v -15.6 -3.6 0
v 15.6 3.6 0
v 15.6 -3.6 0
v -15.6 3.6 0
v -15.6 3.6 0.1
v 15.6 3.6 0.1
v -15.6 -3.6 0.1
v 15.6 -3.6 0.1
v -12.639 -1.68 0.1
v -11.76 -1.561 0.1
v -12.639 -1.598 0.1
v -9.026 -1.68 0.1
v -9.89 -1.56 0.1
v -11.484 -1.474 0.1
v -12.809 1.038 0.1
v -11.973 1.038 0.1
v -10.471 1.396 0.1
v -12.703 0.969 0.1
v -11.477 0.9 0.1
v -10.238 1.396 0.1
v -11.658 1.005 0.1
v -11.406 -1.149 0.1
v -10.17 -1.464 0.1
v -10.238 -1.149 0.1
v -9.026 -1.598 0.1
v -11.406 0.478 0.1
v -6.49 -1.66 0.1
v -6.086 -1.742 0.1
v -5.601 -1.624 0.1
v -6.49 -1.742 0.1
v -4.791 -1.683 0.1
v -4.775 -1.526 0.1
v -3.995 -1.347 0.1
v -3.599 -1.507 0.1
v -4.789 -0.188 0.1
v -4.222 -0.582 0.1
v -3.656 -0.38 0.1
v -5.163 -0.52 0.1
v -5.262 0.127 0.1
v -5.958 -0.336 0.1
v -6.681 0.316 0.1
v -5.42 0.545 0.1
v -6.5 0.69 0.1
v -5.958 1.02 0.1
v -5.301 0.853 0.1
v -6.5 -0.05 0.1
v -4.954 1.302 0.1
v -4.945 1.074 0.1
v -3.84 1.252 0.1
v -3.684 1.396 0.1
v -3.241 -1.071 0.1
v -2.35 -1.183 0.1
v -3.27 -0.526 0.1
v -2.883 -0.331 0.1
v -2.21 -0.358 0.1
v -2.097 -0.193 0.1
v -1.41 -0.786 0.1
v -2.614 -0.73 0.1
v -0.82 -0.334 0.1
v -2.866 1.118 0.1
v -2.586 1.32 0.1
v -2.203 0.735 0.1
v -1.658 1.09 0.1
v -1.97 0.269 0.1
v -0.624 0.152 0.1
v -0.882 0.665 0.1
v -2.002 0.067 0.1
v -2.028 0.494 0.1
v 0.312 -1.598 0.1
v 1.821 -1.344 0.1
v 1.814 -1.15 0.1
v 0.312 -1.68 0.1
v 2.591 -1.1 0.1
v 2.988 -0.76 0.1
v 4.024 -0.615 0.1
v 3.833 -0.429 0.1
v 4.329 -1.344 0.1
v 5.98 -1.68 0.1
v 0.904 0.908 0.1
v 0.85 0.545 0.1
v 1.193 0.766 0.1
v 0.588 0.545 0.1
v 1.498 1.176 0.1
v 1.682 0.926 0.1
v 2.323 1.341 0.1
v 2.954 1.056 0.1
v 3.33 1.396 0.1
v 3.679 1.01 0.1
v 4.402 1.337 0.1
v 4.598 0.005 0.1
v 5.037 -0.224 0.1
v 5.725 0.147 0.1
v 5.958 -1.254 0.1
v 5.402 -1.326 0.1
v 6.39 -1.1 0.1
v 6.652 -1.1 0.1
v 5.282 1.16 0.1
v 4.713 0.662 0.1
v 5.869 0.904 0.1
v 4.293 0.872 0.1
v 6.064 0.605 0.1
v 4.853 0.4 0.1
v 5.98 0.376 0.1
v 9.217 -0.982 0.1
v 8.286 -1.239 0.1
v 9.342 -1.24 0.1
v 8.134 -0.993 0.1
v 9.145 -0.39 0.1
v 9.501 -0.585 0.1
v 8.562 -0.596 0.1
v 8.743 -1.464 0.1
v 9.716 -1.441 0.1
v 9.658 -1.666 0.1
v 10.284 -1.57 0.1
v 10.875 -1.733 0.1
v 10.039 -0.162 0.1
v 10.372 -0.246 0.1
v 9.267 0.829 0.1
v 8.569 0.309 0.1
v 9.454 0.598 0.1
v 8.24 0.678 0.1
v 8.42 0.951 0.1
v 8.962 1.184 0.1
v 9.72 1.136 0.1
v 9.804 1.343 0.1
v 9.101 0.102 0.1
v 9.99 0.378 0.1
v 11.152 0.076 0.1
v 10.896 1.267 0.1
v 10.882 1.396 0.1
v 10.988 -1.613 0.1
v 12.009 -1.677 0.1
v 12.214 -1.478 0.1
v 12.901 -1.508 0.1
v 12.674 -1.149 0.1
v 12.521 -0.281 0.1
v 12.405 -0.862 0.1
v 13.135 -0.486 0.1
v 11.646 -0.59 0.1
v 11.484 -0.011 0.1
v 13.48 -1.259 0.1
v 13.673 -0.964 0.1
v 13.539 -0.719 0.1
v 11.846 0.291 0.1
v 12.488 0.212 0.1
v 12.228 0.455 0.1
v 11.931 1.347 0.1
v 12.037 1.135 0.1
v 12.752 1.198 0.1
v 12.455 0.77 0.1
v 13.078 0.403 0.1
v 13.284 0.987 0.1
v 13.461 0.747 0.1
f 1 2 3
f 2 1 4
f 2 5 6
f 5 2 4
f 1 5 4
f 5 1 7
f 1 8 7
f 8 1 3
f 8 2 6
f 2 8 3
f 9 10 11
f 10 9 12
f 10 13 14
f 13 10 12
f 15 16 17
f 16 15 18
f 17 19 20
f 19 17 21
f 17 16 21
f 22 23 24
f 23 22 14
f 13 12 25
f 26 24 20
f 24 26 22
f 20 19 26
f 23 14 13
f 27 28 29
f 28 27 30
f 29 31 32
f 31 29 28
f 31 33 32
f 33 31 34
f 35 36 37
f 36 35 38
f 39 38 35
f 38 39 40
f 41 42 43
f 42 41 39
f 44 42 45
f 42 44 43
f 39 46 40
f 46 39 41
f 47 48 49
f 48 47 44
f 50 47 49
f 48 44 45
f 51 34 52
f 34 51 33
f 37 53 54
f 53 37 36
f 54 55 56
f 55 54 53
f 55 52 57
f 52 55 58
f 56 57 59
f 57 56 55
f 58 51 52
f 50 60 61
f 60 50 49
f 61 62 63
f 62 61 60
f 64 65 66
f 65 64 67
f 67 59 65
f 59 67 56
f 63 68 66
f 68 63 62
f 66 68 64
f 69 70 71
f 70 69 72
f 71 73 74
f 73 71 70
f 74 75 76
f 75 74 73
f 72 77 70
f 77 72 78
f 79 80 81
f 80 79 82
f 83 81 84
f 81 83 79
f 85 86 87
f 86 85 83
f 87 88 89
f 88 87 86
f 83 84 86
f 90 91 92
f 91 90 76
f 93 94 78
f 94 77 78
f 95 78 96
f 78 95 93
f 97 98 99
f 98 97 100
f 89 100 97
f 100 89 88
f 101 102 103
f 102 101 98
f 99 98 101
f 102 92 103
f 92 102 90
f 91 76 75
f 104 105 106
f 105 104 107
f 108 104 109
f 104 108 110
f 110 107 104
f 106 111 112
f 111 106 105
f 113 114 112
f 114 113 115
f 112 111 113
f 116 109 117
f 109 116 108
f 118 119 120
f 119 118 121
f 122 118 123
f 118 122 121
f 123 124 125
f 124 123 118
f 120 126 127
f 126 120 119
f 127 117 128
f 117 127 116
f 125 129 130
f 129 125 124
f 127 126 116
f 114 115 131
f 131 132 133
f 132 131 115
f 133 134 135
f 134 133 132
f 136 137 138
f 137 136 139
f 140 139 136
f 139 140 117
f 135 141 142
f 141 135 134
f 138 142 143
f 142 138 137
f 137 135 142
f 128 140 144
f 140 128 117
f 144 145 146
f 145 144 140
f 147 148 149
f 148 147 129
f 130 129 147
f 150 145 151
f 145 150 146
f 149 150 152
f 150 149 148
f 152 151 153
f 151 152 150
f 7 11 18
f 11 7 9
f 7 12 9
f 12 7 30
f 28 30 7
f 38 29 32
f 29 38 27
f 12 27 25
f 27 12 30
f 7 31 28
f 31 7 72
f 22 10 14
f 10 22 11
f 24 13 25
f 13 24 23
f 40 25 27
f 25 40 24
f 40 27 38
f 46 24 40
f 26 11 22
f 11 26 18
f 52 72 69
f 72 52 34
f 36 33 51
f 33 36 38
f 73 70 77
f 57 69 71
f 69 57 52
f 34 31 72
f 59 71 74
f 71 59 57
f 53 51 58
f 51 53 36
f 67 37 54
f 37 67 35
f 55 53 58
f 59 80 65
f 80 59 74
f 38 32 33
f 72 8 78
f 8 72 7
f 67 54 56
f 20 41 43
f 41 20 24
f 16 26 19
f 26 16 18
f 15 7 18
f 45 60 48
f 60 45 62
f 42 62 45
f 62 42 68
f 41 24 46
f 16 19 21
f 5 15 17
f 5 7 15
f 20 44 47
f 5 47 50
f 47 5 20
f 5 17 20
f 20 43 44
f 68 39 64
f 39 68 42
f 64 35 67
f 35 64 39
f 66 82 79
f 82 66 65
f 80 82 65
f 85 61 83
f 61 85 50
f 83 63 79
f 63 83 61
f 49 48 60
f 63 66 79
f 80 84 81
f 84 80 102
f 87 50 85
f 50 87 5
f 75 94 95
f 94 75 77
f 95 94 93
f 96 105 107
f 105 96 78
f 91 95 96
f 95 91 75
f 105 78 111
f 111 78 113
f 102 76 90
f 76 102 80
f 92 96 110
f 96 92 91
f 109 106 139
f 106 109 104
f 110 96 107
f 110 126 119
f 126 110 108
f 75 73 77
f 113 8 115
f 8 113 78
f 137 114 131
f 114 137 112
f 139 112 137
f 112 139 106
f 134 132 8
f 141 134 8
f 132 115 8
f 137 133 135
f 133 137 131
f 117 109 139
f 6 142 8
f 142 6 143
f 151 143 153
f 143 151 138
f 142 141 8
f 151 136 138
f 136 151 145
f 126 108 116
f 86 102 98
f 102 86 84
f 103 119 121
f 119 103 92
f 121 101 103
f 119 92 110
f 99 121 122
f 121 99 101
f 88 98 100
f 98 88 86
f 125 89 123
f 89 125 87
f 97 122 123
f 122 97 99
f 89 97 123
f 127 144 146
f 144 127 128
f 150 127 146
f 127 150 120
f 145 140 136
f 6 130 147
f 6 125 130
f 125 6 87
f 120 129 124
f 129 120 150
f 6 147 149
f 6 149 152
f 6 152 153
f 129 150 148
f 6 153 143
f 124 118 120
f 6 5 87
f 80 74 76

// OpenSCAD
// file: ../p/box5-12.scad
use <../lib.scad>
function ldraw_lib__box5_12() = [
// 0 Box with 5 Faces without Any Edges
// 0 Name: box5-12.dat
// 0 Author: Chris Dee [cwdee]
// 0 !LDRAW_ORG Primitive UPDATE 2009-02
// 0 !LICENSE Licensed under CC BY 2.0 and CC BY 4.0 : see CAreadme.txt
// 
// 0 BFC CERTIFY CCW
  [0,"BFC","CERTIFY"],
  [0,"BFC","CCW"],
// 
// 0 !HISTORY 2009-09-03 [PTadmin] Official Update 2009-02
// 
// 
// 4 16 1 1 1 1 1 -1 -1 1 -1 -1 1 1
  [4,16,1,1,1,1,1,-1,-1,1,-1,-1,1,1],
// 4 16 -1 0 1 1 0 1 1 1 1 -1 1 1
  [4,16,-1,0,1,1,0,1,1,1,1,-1,1,1],
// 4 16 -1 0 -1 -1 0 1 -1 1 1 -1 1 -1
  [4,16,-1,0,-1,-1,0,1,-1,1,1,-1,1,-1],
// 4 16 1 0 -1 -1 0 -1 -1 1 -1 1 1 -1
  [4,16,1,0,-1,-1,0,-1,-1,1,-1,1,1,-1],
// 4 16 1 0 1 1 0 -1 1 1 -1 1 1 1
  [4,16,1,0,1,1,0,-1,1,1,-1,1,1,1],
// 0
];
module ldraw_lib__box5_12(step=0, col=false, unit=2/5, alt=false, line=0.2, solid=!$preview)
    makepoly(ldraw_lib__box5_12(), step=step, col=col, unit=unit, alt=alt, line=line, solid=solid);
ldraw_lib__box5_12(line=0.2);
// main file
use <../lib.scad>
use <../p/box5-12.scad>
function ldraw_lib__4188571l() = [
// 0 Sticker  0.9 x  3.9 with Black "1928"
// 0 Name: 4188571l.dat
// 0 Author: Gerald Lasser [GeraldLasser]
// 0 !LDRAW_ORG Part UPDATE 2015-01
// 0 !LICENSE Licensed under CC BY 2.0 and CC BY 4.0 : see CAreadme.txt
// 
// 0 BFC CERTIFY CCW
  [0,"BFC","CERTIFY"],
  [0,"BFC","CCW"],
// 
// 0 !KEYWORDS santa fe, Train
// 
// 0 !HISTORY 2015-10-11 [PTadmin] Official Update 2015-01
// 
// 
// 0 // Original Text Produced by txt2dat, Copyright 2005-2007, 2009 R. Crawford
// 0 // Using font: "Times New Roman" style: "Regular" size: 40pt
// 0 // LDRAW Scaling of Txt2dat output: 1.02 0 0 0 1 0 0 0 0.32
// 
// 1 80 0 -0.25 0 39 0 0 0 0.25 0 0 0 9 box5-12.dat
  [1,80,0,-0.25,0,39,0,0,0,0.25,0,0,0,9, ldraw_lib__box5_12()],
// 
// 4 0 -29.401 -0.25 -3.903 -31.598 -0.25 -3.994 -31.598 -0.25 -4.2 -22.564 -0.25 -4.2
  [4,0,-29.401,-0.25,-3.903,-31.598,-0.25,-3.994,-31.598,-0.25,-4.2,-22.564,-0.25,-4.2],
// 4 0 -24.726 -0.25 -3.9 -28.711 -0.25 -3.686 -29.401 -0.25 -3.903 -22.564 -0.25 -4.2
  [4,0,-24.726,-0.25,-3.9,-28.711,-0.25,-3.686,-29.401,-0.25,-3.903,-22.564,-0.25,-4.2],
// 4 0 -32.023 -0.25 2.596 -31.758 -0.25 2.423 -29.933 -0.25 2.596 -26.178 -0.25 3.49
  [4,0,-32.023,-0.25,2.596,-31.758,-0.25,2.423,-29.933,-0.25,2.596,-26.178,-0.25,3.49],
// 4 0 -26.178 -0.25 3.49 -29.144 -0.25 2.512 -28.693 -0.25 2.251 -25.594 -0.25 3.49
  [4,0,-26.178,-0.25,3.49,-29.144,-0.25,2.512,-28.693,-0.25,2.251,-25.594,-0.25,3.49],
// 3 0 -26.178 -0.25 3.49 -29.933 -0.25 2.596 -29.144 -0.25 2.512
  [3,0,-26.178,-0.25,3.49,-29.933,-0.25,2.596,-29.144,-0.25,2.512],
// 4 0 -28.516 -0.25 -2.872 -28.711 -0.25 -3.686 -25.426 -0.25 -3.661 -25.594 -0.25 -2.872
  [4,0,-28.516,-0.25,-2.872,-28.711,-0.25,-3.686,-25.426,-0.25,-3.661,-25.594,-0.25,-2.872],
// 3 0 -24.726 -0.25 -3.9 -22.564 -0.25 -4.2 -22.564 -0.25 -3.994
  [3,0,-24.726,-0.25,-3.9,-22.564,-0.25,-4.2,-22.564,-0.25,-3.994],
// 4 0 -28.516 -0.25 1.196 -28.516 -0.25 -2.872 -25.594 -0.25 -2.872 -25.594 -0.25 3.49
  [4,0,-28.516,-0.25,1.196,-28.516,-0.25,-2.872,-25.594,-0.25,-2.872,-25.594,-0.25,3.49],
// 3 0 -25.594 -0.25 3.49 -28.693 -0.25 2.251 -28.516 -0.25 1.196
  [3,0,-25.594,-0.25,3.49,-28.693,-0.25,2.251,-28.516,-0.25,1.196],
// 3 0 -25.426 -0.25 -3.661 -28.711 -0.25 -3.686 -24.726 -0.25 -3.9
  [3,0,-25.426,-0.25,-3.661,-28.711,-0.25,-3.686,-24.726,-0.25,-3.9],
// 4 0 -16.224 -0.25 -4.15 -16.224 -0.25 -4.356 -15.214 -0.25 -4.356 -14.002 -0.25 -4.06
  [4,0,-16.224,-0.25,-4.15,-16.224,-0.25,-4.356,-15.214,-0.25,-4.356,-14.002,-0.25,-4.06],
// 4 0 -14.002 -0.25 -4.06 -15.214 -0.25 -4.356 -11.978 -0.25 -4.208 -11.938 -0.25 -3.814
  [4,0,-14.002,-0.25,-4.06,-15.214,-0.25,-4.356,-11.978,-0.25,-4.208,-11.938,-0.25,-3.814],
// 4 0 -8.997 -0.25 -3.767 -9.988 -0.25 -3.367 -11.938 -0.25 -3.814 -11.978 -0.25 -4.208
  [4,0,-8.997,-0.25,-3.767,-9.988,-0.25,-3.367,-11.938,-0.25,-3.814,-11.978,-0.25,-4.208],
// 4 0 -10.556 -0.25 -1.455 -9.139 -0.25 -0.949 -11.973 -0.25 -0.471 -12.907 -0.25 -1.301
  [4,0,-10.556,-0.25,-1.455,-9.139,-0.25,-0.949,-11.973,-0.25,-0.471,-12.907,-0.25,-1.301],
// 4 0 -14.896 -0.25 -0.841 -12.907 -0.25 -1.301 -11.973 -0.25 -0.471 -13.156 -0.25 0.317
  [4,0,-14.896,-0.25,-0.841,-12.907,-0.25,-1.301,-11.973,-0.25,-0.471,-13.156,-0.25,0.317],
// 4 0 -16.703 -0.25 0.79 -13.156 -0.25 0.317 -13.55 -0.25 1.362 -16.251 -0.25 1.725
  [4,0,-16.703,-0.25,0.79,-13.156,-0.25,0.317,-13.55,-0.25,1.362,-16.251,-0.25,1.725],
// 4 0 -13.253 -0.25 2.132 -14.896 -0.25 2.551 -16.251 -0.25 1.725 -13.55 -0.25 1.362
  [4,0,-13.253,-0.25,2.132,-14.896,-0.25,2.551,-16.251,-0.25,1.725,-13.55,-0.25,1.362],
// 4 0 -13.156 -0.25 0.317 -16.703 -0.25 0.79 -16.251 -0.25 -0.126 -14.896 -0.25 -0.841
  [4,0,-13.156,-0.25,0.317,-16.703,-0.25,0.79,-16.251,-0.25,-0.126,-14.896,-0.25,-0.841],
// 4 0 -12.363 -0.25 2.685 -9.6 -0.25 3.129 -12.385 -0.25 3.256 -14.896 -0.25 2.551
  [4,0,-12.363,-0.25,2.685,-9.6,-0.25,3.129,-12.385,-0.25,3.256,-14.896,-0.25,2.551],
// 3 0 -9.211 -0.25 3.49 -12.385 -0.25 3.256 -9.6 -0.25 3.129
  [3,0,-9.211,-0.25,3.49,-12.385,-0.25,3.256,-9.6,-0.25,3.129],
// 3 0 -12.363 -0.25 2.685 -14.896 -0.25 2.551 -13.253 -0.25 2.132
  [3,0,-12.363,-0.25,2.685,-14.896,-0.25,2.551,-13.253,-0.25,2.132],
// 4 0 -8.997 -0.25 -3.767 -5.875 -0.25 -2.957 -8.103 -0.25 -2.677 -9.988 -0.25 -3.367
  [4,0,-8.997,-0.25,-3.767,-5.875,-0.25,-2.957,-8.103,-0.25,-2.677,-9.988,-0.25,-3.367],
// 4 0 -8.174 -0.25 -1.315 -7.208 -0.25 -0.827 -9.139 -0.25 -0.949 -10.556 -0.25 -1.455
  [4,0,-8.174,-0.25,-1.315,-7.208,-0.25,-0.827,-9.139,-0.25,-0.949,-10.556,-0.25,-1.455],
// 4 0 -7.208 -0.25 -0.827 -8.174 -0.25 -1.315 -5.526 -0.25 -0.894 -5.243 -0.25 -0.483
  [4,0,-7.208,-0.25,-0.827,-8.174,-0.25,-1.315,-5.526,-0.25,-0.894,-5.243,-0.25,-0.483],
// 4 0 -6.534 -0.25 -1.826 -5.875 -0.25 -2.957 -3.525 -0.25 -1.964 -5.526 -0.25 -0.894
  [4,0,-6.534,-0.25,-1.826,-5.875,-0.25,-2.957,-3.525,-0.25,-1.964,-5.526,-0.25,-0.894],
// 4 0 -5.526 -0.25 -0.894 -3.525 -0.25 -1.964 -2.05 -0.25 -0.835 -5.243 -0.25 -0.483
  [4,0,-5.526,-0.25,-0.894,-3.525,-0.25,-1.964,-2.05,-0.25,-0.835,-5.243,-0.25,-0.483],
// 3 0 -6.534 -0.25 -1.826 -8.103 -0.25 -2.677 -5.875 -0.25 -2.957
  [3,0,-6.534,-0.25,-1.826,-8.103,-0.25,-2.677,-5.875,-0.25,-2.957],
// 4 0 -7.164 -0.25 2.796 -6.465 -0.25 3.299 -9.211 -0.25 3.49 -9.6 -0.25 3.129
  [4,0,-7.164,-0.25,2.796,-6.465,-0.25,3.299,-9.211,-0.25,3.49,-9.6,-0.25,3.129],
// 4 0 -4.144 -0.25 2.724 -6.465 -0.25 3.299 -7.164 -0.25 2.796 -5.508 -0.25 1.837
  [4,0,-4.144,-0.25,2.724,-6.465,-0.25,3.299,-7.164,-0.25,2.796,-5.508,-0.25,1.837],
// 4 0 -4.924 -0.25 0.673 -5.004 -0.25 0.167 -1.559 -0.25 0.379 -2.205 -0.25 1.662
  [4,0,-4.924,-0.25,0.673,-5.004,-0.25,0.167,-1.559,-0.25,0.379,-2.205,-0.25,1.662],
// 4 0 -5.004 -0.25 0.167 -5.243 -0.25 -0.483 -2.05 -0.25 -0.835 -1.559 -0.25 0.379
  [4,0,-5.004,-0.25,0.167,-5.243,-0.25,-0.483,-2.05,-0.25,-0.835,-1.559,-0.25,0.379],
// 4 0 -2.205 -0.25 1.662 -4.144 -0.25 2.724 -5.508 -0.25 1.837 -5.069 -0.25 1.234
  [4,0,-2.205,-0.25,1.662,-4.144,-0.25,2.724,-5.508,-0.25,1.837,-5.069,-0.25,1.234],
// 3 0 -2.205 -0.25 1.662 -5.069 -0.25 1.234 -4.924 -0.25 0.673
  [3,0,-2.205,-0.25,1.662,-5.069,-0.25,1.234,-4.924,-0.25,0.673],
// 4 0 4.552 -0.25 -3.361 4.536 -0.25 -2.875 0.779 -0.25 -3.994 0.779 -0.25 -4.2
  [4,0,4.552,-0.25,-3.361,4.536,-0.25,-2.875,0.779,-0.25,-3.994,0.779,-0.25,-4.2],
// 4 0 6.478 -0.25 -2.75 7.47 -0.25 -1.9 4.536 -0.25 -2.875 4.552 -0.25 -3.361
  [4,0,6.478,-0.25,-2.75,7.47,-0.25,-1.9,4.536,-0.25,-2.875,4.552,-0.25,-3.361],
// 4 0 10.06 -0.25 -1.538 9.582 -0.25 -1.072 7.47 -0.25 -1.9 6.478 -0.25 -2.75
  [4,0,10.06,-0.25,-1.538,9.582,-0.25,-1.072,7.47,-0.25,-1.9,6.478,-0.25,-2.75],
// 4 0 10.822 -0.25 -3.361 4.552 -0.25 -3.361 0.779 -0.25 -4.2 14.949 -0.25 -4.2
  [4,0,10.822,-0.25,-3.361,4.552,-0.25,-3.361,0.779,-0.25,-4.2,14.949,-0.25,-4.2],
// 4 0 2.982 -0.25 1.915 2.26 -0.25 2.271 1.47 -0.25 1.362 2.126 -0.25 1.362
  [4,0,2.982,-0.25,1.915,2.26,-0.25,2.271,1.47,-0.25,1.362,2.126,-0.25,1.362],
// 4 0 4.206 -0.25 2.315 3.746 -0.25 2.94 2.26 -0.25 2.271 2.982 -0.25 1.915
  [4,0,4.206,-0.25,2.315,3.746,-0.25,2.94,2.26,-0.25,2.271,2.982,-0.25,1.915],
// 4 0 7.386 -0.25 2.64 8.324 -0.25 3.49 5.807 -0.25 3.353 3.746 -0.25 2.94
  [4,0,7.386,-0.25,2.64,8.324,-0.25,3.49,5.807,-0.25,3.353,3.746,-0.25,2.94],
// 4 0 8.324 -0.25 3.49 7.386 -0.25 2.64 9.197 -0.25 2.525 11.006 -0.25 3.343
  [4,0,8.324,-0.25,3.49,7.386,-0.25,2.64,9.197,-0.25,2.525,11.006,-0.25,3.343],
// 3 0 3.746 -0.25 2.94 4.206 -0.25 2.315 7.386 -0.25 2.64
  [3,0,3.746,-0.25,2.94,4.206,-0.25,2.315,7.386,-0.25,2.64],
// 4 0 12.593 -0.25 -0.559 14.312 -0.25 0.368 11.495 -0.25 0.013 9.582 -0.25 -1.072
  [4,0,12.593,-0.25,-0.559,14.312,-0.25,0.368,11.495,-0.25,0.013,9.582,-0.25,-1.072],
// 3 0 14.896 -0.25 -3.136 13.505 -0.25 -3.316 14.949 -0.25 -4.2
  [3,0,14.896,-0.25,-3.136,13.505,-0.25,-3.316,14.949,-0.25,-4.2],
// 3 0 13.505 -0.25 -3.316 10.822 -0.25 -3.361 14.949 -0.25 -4.2
  [3,0,13.505,-0.25,-3.316,10.822,-0.25,-3.361,14.949,-0.25,-4.2],
// 4 0 16.631 -0.25 -2.75 15.976 -0.25 -2.75 14.896 -0.25 -3.136 14.949 -0.25 -4.2
  [4,0,16.631,-0.25,-2.75,15.976,-0.25,-2.75,14.896,-0.25,-3.136,14.949,-0.25,-4.2],
// 4 0 10.733 -0.25 2.179 11.783 -0.25 1.654 14.672 -0.25 2.26 13.204 -0.25 2.901
  [4,0,10.733,-0.25,2.179,11.783,-0.25,1.654,14.672,-0.25,2.26,13.204,-0.25,2.901],
// 4 0 11.006 -0.25 3.343 9.197 -0.25 2.525 10.733 -0.25 2.179 13.204 -0.25 2.901
  [4,0,11.006,-0.25,3.343,9.197,-0.25,2.525,10.733,-0.25,2.179,13.204,-0.25,2.901],
// 4 0 15.161 -0.25 1.512 11.783 -0.25 1.654 12.133 -0.25 1.001 14.949 -0.25 0.94
  [4,0,15.161,-0.25,1.512,11.783,-0.25,1.654,12.133,-0.25,1.001,14.949,-0.25,0.94],
// 3 0 14.672 -0.25 2.26 11.783 -0.25 1.654 15.161 -0.25 1.512
  [3,0,14.672,-0.25,2.26,11.783,-0.25,1.654,15.161,-0.25,1.512],
// 4 0 14.312 -0.25 0.368 14.949 -0.25 0.94 12.133 -0.25 1.001 11.495 -0.25 0.013
  [4,0,14.312,-0.25,0.368,14.949,-0.25,0.94,12.133,-0.25,1.001,11.495,-0.25,0.013],
// 3 0 12.593 -0.25 -0.559 9.582 -0.25 -1.072 10.06 -0.25 -1.538
  [3,0,12.593,-0.25,-0.559,9.582,-0.25,-1.072,10.06,-0.25,-1.538],
// 4 0 23.043 -0.25 -2.455 20.334 -0.25 -2.483 20.714 -0.25 -3.097 23.355 -0.25 -3.1
  [4,0,23.043,-0.25,-2.455,20.334,-0.25,-2.483,20.714,-0.25,-3.097,23.355,-0.25,-3.1],
// 4 0 23.752 -0.25 -1.463 22.863 -0.25 -0.974 21.405 -0.25 -1.491 23.043 -0.25 -2.455
  [4,0,23.752,-0.25,-1.463,22.863,-0.25,-0.974,21.405,-0.25,-1.491,23.043,-0.25,-2.455],
// 3 0 21.405 -0.25 -1.491 20.334 -0.25 -2.483 23.043 -0.25 -2.455
  [3,0,21.405,-0.25,-1.491,20.334,-0.25,-2.483,23.043,-0.25,-2.455],
// 4 0 23.355 -0.25 -3.1 20.714 -0.25 -3.097 21.857 -0.25 -3.661 24.291 -0.25 -3.603
  [4,0,23.355,-0.25,-3.1,20.714,-0.25,-3.097,21.857,-0.25,-3.661,24.291,-0.25,-3.603],
// 4 0 24.145 -0.25 -4.165 27.188 -0.25 -4.333 25.711 -0.25 -3.926 24.291 -0.25 -3.603
  [4,0,24.145,-0.25,-4.165,27.188,-0.25,-4.333,25.711,-0.25,-3.926,24.291,-0.25,-3.603],
// 3 0 24.291 -0.25 -3.603 21.857 -0.25 -3.661 24.145 -0.25 -4.165
  [3,0,24.291,-0.25,-3.603,21.857,-0.25,-3.661,24.145,-0.25,-4.165],
// 4 0 22.863 -0.25 -0.974 23.752 -0.25 -1.463 25.93 -0.25 -0.616 25.097 -0.25 -0.405
  [4,0,22.863,-0.25,-0.974,23.752,-0.25,-1.463,25.93,-0.25,-0.616,25.097,-0.25,-0.405],
// 4 0 23.636 -0.25 1.496 23.167 -0.25 2.073 20.599 -0.25 1.696 21.422 -0.25 0.773
  [4,0,23.636,-0.25,1.496,23.167,-0.25,2.073,20.599,-0.25,1.696,21.422,-0.25,0.773],
// 4 0 23.167 -0.25 2.073 22.405 -0.25 2.96 21.05 -0.25 2.378 20.599 -0.25 1.696
  [4,0,23.167,-0.25,2.073,22.405,-0.25,2.96,21.05,-0.25,2.378,20.599,-0.25,1.696],
// 4 0 22.405 -0.25 2.96 23.167 -0.25 2.073 24.3 -0.25 2.84 24.509 -0.25 3.358
  [4,0,22.405,-0.25,2.96,23.167,-0.25,2.073,24.3,-0.25,2.84,24.509,-0.25,3.358],
// 4 0 21.422 -0.25 0.773 22.753 -0.25 0.256 24.974 -0.25 0.946 23.636 -0.25 1.496
  [4,0,21.422,-0.25,0.773,22.753,-0.25,0.256,24.974,-0.25,0.946,23.636,-0.25,1.496],
// 4 0 27.879 -0.25 0.19 24.974 -0.25 0.946 25.097 -0.25 -0.405 25.93 -0.25 -0.616
  [4,0,27.879,-0.25,0.19,24.974,-0.25,0.946,25.097,-0.25,-0.405,25.93,-0.25,-0.616],
// 4 0 27.241 -0.25 3.168 27.205 -0.25 3.49 24.509 -0.25 3.358 24.3 -0.25 2.84
  [4,0,27.241,-0.25,3.168,27.205,-0.25,3.49,24.509,-0.25,3.358,24.3,-0.25,2.84],
// 3 0 24.974 -0.25 0.946 22.753 -0.25 0.256 25.097 -0.25 -0.405
  [3,0,24.974,-0.25,0.946,22.753,-0.25,0.256,25.097,-0.25,-0.405],
// 3 0 25.711 -0.25 -3.926 27.188 -0.25 -4.333 27.471 -0.25 -4.033
  [3,0,25.711,-0.25,-3.926,27.188,-0.25,-4.333,27.471,-0.25,-4.033],
// 4 0 30.022 -0.25 -4.192 30.535 -0.25 -3.694 27.471 -0.25 -4.033 27.188 -0.25 -4.333
  [4,0,30.022,-0.25,-4.192,30.535,-0.25,-3.694,27.471,-0.25,-4.033,27.188,-0.25,-4.333],
// 4 0 30.535 -0.25 -3.694 30.022 -0.25 -4.192 32.253 -0.25 -3.769 31.686 -0.25 -2.872
  [4,0,30.535,-0.25,-3.694,30.022,-0.25,-4.192,32.253,-0.25,-3.769,31.686,-0.25,-2.872],
// 4 0 32.838 -0.25 -1.216 31.302 -0.25 -0.702 29.114 -0.25 -1.476 31.013 -0.25 -2.155
  [4,0,32.838,-0.25,-1.216,31.302,-0.25,-0.702,29.114,-0.25,-1.476,31.013,-0.25,-2.155],
// 4 0 29.114 -0.25 -1.476 31.302 -0.25 -0.702 28.711 -0.25 -0.027 25.93 -0.25 -0.616
  [4,0,29.114,-0.25,-1.476,31.302,-0.25,-0.702,28.711,-0.25,-0.027,25.93,-0.25,-0.616],
// 4 0 31.686 -0.25 -2.872 32.253 -0.25 -3.769 33.701 -0.25 -3.148 34.183 -0.25 -2.411
  [4,0,31.686,-0.25,-2.872,32.253,-0.25,-3.769,33.701,-0.25,-3.148,34.183,-0.25,-2.411],
// 4 0 33.847 -0.25 -1.798 32.838 -0.25 -1.216 31.013 -0.25 -2.155 34.183 -0.25 -2.411
  [4,0,33.847,-0.25,-1.798,32.838,-0.25,-1.216,31.013,-0.25,-2.155,34.183,-0.25,-2.411],
// 3 0 31.013 -0.25 -2.155 31.686 -0.25 -2.872 34.183 -0.25 -2.411
  [3,0,31.013,-0.25,-2.155,31.686,-0.25,-2.872,34.183,-0.25,-2.411],
// 4 0 28.711 -0.25 -0.027 29.614 -0.25 0.727 27.879 -0.25 0.19 25.93 -0.25 -0.616
  [4,0,28.711,-0.25,-0.027,29.614,-0.25,0.727,27.879,-0.25,0.19,25.93,-0.25,-0.616],
// 4 0 29.614 -0.25 0.727 28.711 -0.25 -0.027 31.221 -0.25 0.529 30.57 -0.25 1.137
  [4,0,29.614,-0.25,0.727,28.711,-0.25,-0.027,31.221,-0.25,0.529,30.57,-0.25,1.137],
// 4 0 29.827 -0.25 3.367 27.241 -0.25 3.168 30.092 -0.25 2.837 31.881 -0.25 2.996
  [4,0,29.827,-0.25,3.367,27.241,-0.25,3.168,30.092,-0.25,2.837,31.881,-0.25,2.996],
// 3 0 27.205 -0.25 3.49 27.241 -0.25 3.168 29.827 -0.25 3.367
  [3,0,27.205,-0.25,3.49,27.241,-0.25,3.168,29.827,-0.25,3.367],
// 4 0 30.57 -0.25 1.137 31.221 -0.25 0.529 32.696 -0.25 1.007 31.138 -0.25 1.924
  [4,0,30.57,-0.25,1.137,31.221,-0.25,0.529,32.696,-0.25,1.007,31.138,-0.25,1.924],
// 4 0 31.881 -0.25 2.996 30.092 -0.25 2.837 31.138 -0.25 1.924 33.209 -0.25 2.467
  [4,0,31.881,-0.25,2.996,30.092,-0.25,2.837,31.138,-0.25,1.924,33.209,-0.25,2.467],
// 4 0 33.653 -0.25 1.868 33.209 -0.25 2.467 31.138 -0.25 1.924 32.696 -0.25 1.007
  [4,0,33.653,-0.25,1.868,33.209,-0.25,2.467,31.138,-0.25,1.924,32.696,-0.25,1.007],
// 4 80 -39 -0.25 -9 -31.598 -0.25 -4.2 -31.598 -0.25 -3.994 -31.758 -0.25 2.423
  [4,80,-39,-0.25,-9,-31.598,-0.25,-4.2,-31.598,-0.25,-3.994,-31.758,-0.25,2.423],
// 4 80 -22.564 -0.25 -4.2 -31.598 -0.25 -4.2 -39 -0.25 -9 -16.224 -0.25 -4.356
  [4,80,-22.564,-0.25,-4.2,-31.598,-0.25,-4.2,-39,-0.25,-9,-16.224,-0.25,-4.356],
// 3 80 -15.214 -0.25 -4.356 -16.224 -0.25 -4.356 -39 -0.25 -9
  [3,80,-15.214,-0.25,-4.356,-16.224,-0.25,-4.356,-39,-0.25,-9],
// 4 80 -14.002 -0.25 -4.06 -11.938 -0.25 -3.814 -12.907 -0.25 -1.301 -16.224 -0.25 -4.15
  [4,80,-14.002,-0.25,-4.06,-11.938,-0.25,-3.814,-12.907,-0.25,-1.301,-16.224,-0.25,-4.15],
// 4 80 -16.224 -0.25 -4.15 -22.564 -0.25 -3.994 -22.564 -0.25 -4.2 -16.224 -0.25 -4.356
  [4,80,-16.224,-0.25,-4.15,-22.564,-0.25,-3.994,-22.564,-0.25,-4.2,-16.224,-0.25,-4.356],
// 4 80 0.779 -0.25 -4.2 -11.978 -0.25 -4.208 -15.214 -0.25 -4.356 -39 -0.25 -9
  [4,80,0.779,-0.25,-4.2,-11.978,-0.25,-4.208,-15.214,-0.25,-4.356,-39,-0.25,-9],
// 4 80 -28.711 -0.25 -3.686 -28.516 -0.25 -2.872 -31.598 -0.25 -3.994 -29.401 -0.25 -3.903
  [4,80,-28.711,-0.25,-3.686,-28.516,-0.25,-2.872,-31.598,-0.25,-3.994,-29.401,-0.25,-3.903],
// 4 80 -25.426 -0.25 -3.661 -24.726 -0.25 -3.9 -22.564 -0.25 -3.994 -25.594 -0.25 -2.872
  [4,80,-25.426,-0.25,-3.661,-24.726,-0.25,-3.9,-22.564,-0.25,-3.994,-25.594,-0.25,-2.872],
// 4 80 -14.896 -0.25 -0.841 -25.594 -0.25 -2.872 -22.564 -0.25 -3.994 -16.224 -0.25 -4.15
  [4,80,-14.896,-0.25,-0.841,-25.594,-0.25,-2.872,-22.564,-0.25,-3.994,-16.224,-0.25,-4.15],
// 3 80 -14.896 -0.25 -0.841 -16.224 -0.25 -4.15 -12.907 -0.25 -1.301
  [3,80,-14.896,-0.25,-0.841,-16.224,-0.25,-4.15,-12.907,-0.25,-1.301],
// 3 80 -16.251 -0.25 -0.126 -25.594 -0.25 -2.872 -14.896 -0.25 -0.841
  [3,80,-16.251,-0.25,-0.126,-25.594,-0.25,-2.872,-14.896,-0.25,-0.841],
// 4 80 -31.598 -0.25 -3.994 -28.516 -0.25 -2.872 -28.516 -0.25 1.196 -31.758 -0.25 2.423
  [4,80,-31.598,-0.25,-3.994,-28.516,-0.25,-2.872,-28.516,-0.25,1.196,-31.758,-0.25,2.423],
// 4 80 -5.875 -0.25 -2.957 -8.997 -0.25 -3.767 0.779 -0.25 -4.2 0.779 -0.25 -3.994
  [4,80,-5.875,-0.25,-2.957,-8.997,-0.25,-3.767,0.779,-0.25,-4.2,0.779,-0.25,-3.994],
// 4 80 -10.556 -0.25 -1.455 -12.907 -0.25 -1.301 -9.988 -0.25 -3.367 -8.103 -0.25 -2.677
  [4,80,-10.556,-0.25,-1.455,-12.907,-0.25,-1.301,-9.988,-0.25,-3.367,-8.103,-0.25,-2.677],
// 3 80 6.478 -0.25 -2.75 4.552 -0.25 -3.361 10.822 -0.25 -3.361
  [3,80,6.478,-0.25,-2.75,4.552,-0.25,-3.361,10.822,-0.25,-3.361],
// 4 80 0.779 -0.25 -3.994 4.536 -0.25 -2.875 -3.525 -0.25 -1.964 -5.875 -0.25 -2.957
  [4,80,0.779,-0.25,-3.994,4.536,-0.25,-2.875,-3.525,-0.25,-1.964,-5.875,-0.25,-2.957],
// 3 80 -8.997 -0.25 -3.767 -11.978 -0.25 -4.208 0.779 -0.25 -4.2
  [3,80,-8.997,-0.25,-3.767,-11.978,-0.25,-4.208,0.779,-0.25,-4.2],
// 4 80 4.536 -0.25 -2.875 7.47 -0.25 -1.9 -2.05 -0.25 -0.835 -3.525 -0.25 -1.964
  [4,80,4.536,-0.25,-2.875,7.47,-0.25,-1.9,-2.05,-0.25,-0.835,-3.525,-0.25,-1.964],
// 4 80 -8.174 -0.25 -1.315 -10.556 -0.25 -1.455 -8.103 -0.25 -2.677 -6.534 -0.25 -1.826
  [4,80,-8.174,-0.25,-1.315,-10.556,-0.25,-1.455,-8.103,-0.25,-2.677,-6.534,-0.25,-1.826],
// 4 80 -11.973 -0.25 -0.471 -9.139 -0.25 -0.949 -7.208 -0.25 -0.827 -5.004 -0.25 0.167
  [4,80,-11.973,-0.25,-0.471,-9.139,-0.25,-0.949,-7.208,-0.25,-0.827,-5.004,-0.25,0.167],
// 3 80 -5.526 -0.25 -0.894 -8.174 -0.25 -1.315 -6.534 -0.25 -1.826
  [3,80,-5.526,-0.25,-0.894,-8.174,-0.25,-1.315,-6.534,-0.25,-1.826],
// 4 80 -1.559 -0.25 0.379 -2.05 -0.25 -0.835 7.47 -0.25 -1.9 2.126 -0.25 1.362
  [4,80,-1.559,-0.25,0.379,-2.05,-0.25,-0.835,7.47,-0.25,-1.9,2.126,-0.25,1.362],
// 3 80 -12.907 -0.25 -1.301 -11.938 -0.25 -3.814 -9.988 -0.25 -3.367
  [3,80,-12.907,-0.25,-1.301,-11.938,-0.25,-3.814,-9.988,-0.25,-3.367],
// 4 80 0.779 -0.25 -4.2 -39 -0.25 -9 39 -0.25 -9 14.949 -0.25 -4.2
  [4,80,0.779,-0.25,-4.2,-39,-0.25,-9,39,-0.25,-9,14.949,-0.25,-4.2],
// 3 80 -5.004 -0.25 0.167 -7.208 -0.25 -0.827 -5.243 -0.25 -0.483
  [3,80,-5.004,-0.25,0.167,-7.208,-0.25,-0.827,-5.243,-0.25,-0.483],
// 4 80 -25.594 -0.25 3.49 -25.594 -0.25 -2.872 -16.703 -0.25 0.79 -16.251 -0.25 1.725
  [4,80,-25.594,-0.25,3.49,-25.594,-0.25,-2.872,-16.703,-0.25,0.79,-16.251,-0.25,1.725],
// 4 80 -28.693 -0.25 2.251 -29.933 -0.25 2.596 -31.758 -0.25 2.423 -28.516 -0.25 1.196
  [4,80,-28.693,-0.25,2.251,-29.933,-0.25,2.596,-31.758,-0.25,2.423,-28.516,-0.25,1.196],
// 3 80 -32.023 -0.25 2.596 -39 -0.25 -9 -31.758 -0.25 2.423
  [3,80,-32.023,-0.25,2.596,-39,-0.25,-9,-31.758,-0.25,2.423],
// 4 80 -7.164 -0.25 2.796 -12.363 -0.25 2.685 -13.253 -0.25 2.132 -5.508 -0.25 1.837
  [4,80,-7.164,-0.25,2.796,-12.363,-0.25,2.685,-13.253,-0.25,2.132,-5.508,-0.25,1.837],
// 4 80 -5.508 -0.25 1.837 -13.253 -0.25 2.132 -13.55 -0.25 1.362 -5.069 -0.25 1.234
  [4,80,-5.508,-0.25,1.837,-13.253,-0.25,2.132,-13.55,-0.25,1.362,-5.069,-0.25,1.234],
// 3 80 -16.703 -0.25 0.79 -25.594 -0.25 -2.872 -16.251 -0.25 -0.126
  [3,80,-16.703,-0.25,0.79,-25.594,-0.25,-2.872,-16.251,-0.25,-0.126],
// 3 80 -29.933 -0.25 2.596 -28.693 -0.25 2.251 -29.144 -0.25 2.512
  [3,80,-29.933,-0.25,2.596,-28.693,-0.25,2.251,-29.144,-0.25,2.512],
// 3 80 -39 -0.25 9 -32.023 -0.25 2.596 -26.178 -0.25 3.49
  [3,80,-39,-0.25,9,-32.023,-0.25,2.596,-26.178,-0.25,3.49],
// 3 80 -39 -0.25 9 -39 -0.25 -9 -32.023 -0.25 2.596
  [3,80,-39,-0.25,9,-39,-0.25,-9,-32.023,-0.25,2.596],
// 3 80 -25.594 -0.25 3.49 -14.896 -0.25 2.551 -12.385 -0.25 3.256
  [3,80,-25.594,-0.25,3.49,-14.896,-0.25,2.551,-12.385,-0.25,3.256],
// 4 80 -9.211 -0.25 3.49 -39 -0.25 9 -25.594 -0.25 3.49 -12.385 -0.25 3.256
  [4,80,-9.211,-0.25,3.49,-39,-0.25,9,-25.594,-0.25,3.49,-12.385,-0.25,3.256],
// 3 80 -39 -0.25 9 -26.178 -0.25 3.49 -25.594 -0.25 3.49
  [3,80,-39,-0.25,9,-26.178,-0.25,3.49,-25.594,-0.25,3.49],
// 3 80 -25.594 -0.25 3.49 -16.251 -0.25 1.725 -14.896 -0.25 2.551
  [3,80,-25.594,-0.25,3.49,-16.251,-0.25,1.725,-14.896,-0.25,2.551],
// 4 80 -5.069 -0.25 1.234 -13.55 -0.25 1.362 -13.156 -0.25 0.317 -4.924 -0.25 0.673
  [4,80,-5.069,-0.25,1.234,-13.55,-0.25,1.362,-13.156,-0.25,0.317,-4.924,-0.25,0.673],
// 4 80 -5.004 -0.25 0.167 -4.924 -0.25 0.673 -13.156 -0.25 0.317 -11.973 -0.25 -0.471
  [4,80,-5.004,-0.25,0.167,-4.924,-0.25,0.673,-13.156,-0.25,0.317,-11.973,-0.25,-0.471],
// 4 80 1.47 -0.25 1.362 2.26 -0.25 2.271 -2.205 -0.25 1.662 -1.559 -0.25 0.379
  [4,80,1.47,-0.25,1.362,2.26,-0.25,2.271,-2.205,-0.25,1.662,-1.559,-0.25,0.379],
// 3 80 2.126 -0.25 1.362 1.47 -0.25 1.362 -1.559 -0.25 0.379
  [3,80,2.126,-0.25,1.362,1.47,-0.25,1.362,-1.559,-0.25,0.379],
// 4 80 5.807 -0.25 3.353 -9.211 -0.25 3.49 -6.465 -0.25 3.299 3.746 -0.25 2.94
  [4,80,5.807,-0.25,3.353,-9.211,-0.25,3.49,-6.465,-0.25,3.299,3.746,-0.25,2.94],
// 4 80 3.746 -0.25 2.94 -6.465 -0.25 3.299 -4.144 -0.25 2.724 2.26 -0.25 2.271
  [4,80,3.746,-0.25,2.94,-6.465,-0.25,3.299,-4.144,-0.25,2.724,2.26,-0.25,2.271],
// 3 80 -9.6 -0.25 3.129 -12.363 -0.25 2.685 -7.164 -0.25 2.796
  [3,80,-9.6,-0.25,3.129,-12.363,-0.25,2.685,-7.164,-0.25,2.796],
// 3 80 -4.144 -0.25 2.724 -2.205 -0.25 1.662 2.26 -0.25 2.271
  [3,80,-4.144,-0.25,2.724,-2.205,-0.25,1.662,2.26,-0.25,2.271],
// 4 80 12.133 -0.25 1.001 4.206 -0.25 2.315 2.982 -0.25 1.915 2.126 -0.25 1.362
  [4,80,12.133,-0.25,1.001,4.206,-0.25,2.315,2.982,-0.25,1.915,2.126,-0.25,1.362],
// 4 80 8.324 -0.25 3.49 -39 -0.25 9 -9.211 -0.25 3.49 5.807 -0.25 3.353
  [4,80,8.324,-0.25,3.49,-39,-0.25,9,-9.211,-0.25,3.49,5.807,-0.25,3.353],
// 4 80 10.06 -0.25 -1.538 10.822 -0.25 -3.361 13.505 -0.25 -3.316 15.976 -0.25 -2.75
  [4,80,10.06,-0.25,-1.538,10.822,-0.25,-3.361,13.505,-0.25,-3.316,15.976,-0.25,-2.75],
// 3 80 15.976 -0.25 -2.75 13.505 -0.25 -3.316 14.896 -0.25 -3.136
  [3,80,15.976,-0.25,-2.75,13.505,-0.25,-3.316,14.896,-0.25,-3.136],
// 4 80 16.631 -0.25 -2.75 14.949 -0.25 -4.2 20.714 -0.25 -3.097 20.334 -0.25 -2.483
  [4,80,16.631,-0.25,-2.75,14.949,-0.25,-4.2,20.714,-0.25,-3.097,20.334,-0.25,-2.483],
// 4 80 15.976 -0.25 -2.75 16.631 -0.25 -2.75 12.593 -0.25 -0.559 10.06 -0.25 -1.538
  [4,80,15.976,-0.25,-2.75,16.631,-0.25,-2.75,12.593,-0.25,-0.559,10.06,-0.25,-1.538],
// 3 80 20.714 -0.25 -3.097 14.949 -0.25 -4.2 21.857 -0.25 -3.661
  [3,80,20.714,-0.25,-3.097,14.949,-0.25,-4.2,21.857,-0.25,-3.661],
// 3 80 21.857 -0.25 -3.661 14.949 -0.25 -4.2 24.145 -0.25 -4.165
  [3,80,21.857,-0.25,-3.661,14.949,-0.25,-4.2,24.145,-0.25,-4.165],
// 4 80 2.126 -0.25 1.362 9.582 -0.25 -1.072 11.495 -0.25 0.013 12.133 -0.25 1.001
  [4,80,2.126,-0.25,1.362,9.582,-0.25,-1.072,11.495,-0.25,0.013,12.133,-0.25,1.001],
// 4 80 21.405 -0.25 -1.491 14.312 -0.25 0.368 12.593 -0.25 -0.559 16.631 -0.25 -2.75
  [4,80,21.405,-0.25,-1.491,14.312,-0.25,0.368,12.593,-0.25,-0.559,16.631,-0.25,-2.75],
// 4 80 29.114 -0.25 -1.476 23.752 -0.25 -1.463 23.043 -0.25 -2.455 23.355 -0.25 -3.1
  [4,80,29.114,-0.25,-1.476,23.752,-0.25,-1.463,23.043,-0.25,-2.455,23.355,-0.25,-3.1],
// 3 80 21.405 -0.25 -1.491 16.631 -0.25 -2.75 20.334 -0.25 -2.483
  [3,80,21.405,-0.25,-1.491,16.631,-0.25,-2.75,20.334,-0.25,-2.483],
// 4 80 21.405 -0.25 -1.491 22.863 -0.25 -0.974 22.753 -0.25 0.256 21.422 -0.25 0.773
  [4,80,21.405,-0.25,-1.491,22.863,-0.25,-0.974,22.753,-0.25,0.256,21.422,-0.25,0.773],
// 3 80 10.06 -0.25 -1.538 6.478 -0.25 -2.75 10.822 -0.25 -3.361
  [3,80,10.06,-0.25,-1.538,6.478,-0.25,-2.75,10.822,-0.25,-3.361],
// 4 80 27.188 -0.25 -4.333 24.145 -0.25 -4.165 14.949 -0.25 -4.2 39 -0.25 -9
  [4,80,27.188,-0.25,-4.333,24.145,-0.25,-4.165,14.949,-0.25,-4.2,39,-0.25,-9],
// 4 80 24.291 -0.25 -3.603 25.711 -0.25 -3.926 27.471 -0.25 -4.033 31.013 -0.25 -2.155
  [4,80,24.291,-0.25,-3.603,25.711,-0.25,-3.926,27.471,-0.25,-4.033,31.013,-0.25,-2.155],
// 4 80 23.355 -0.25 -3.1 24.291 -0.25 -3.603 31.013 -0.25 -2.155 29.114 -0.25 -1.476
  [4,80,23.355,-0.25,-3.1,24.291,-0.25,-3.603,31.013,-0.25,-2.155,29.114,-0.25,-1.476],
// 3 80 32.253 -0.25 -3.769 30.022 -0.25 -4.192 39 -0.25 -9
  [3,80,32.253,-0.25,-3.769,30.022,-0.25,-4.192,39,-0.25,-9],
// 3 80 33.701 -0.25 -3.148 32.253 -0.25 -3.769 39 -0.25 -9
  [3,80,33.701,-0.25,-3.148,32.253,-0.25,-3.769,39,-0.25,-9],
// 3 80 30.022 -0.25 -4.192 27.188 -0.25 -4.333 39 -0.25 -9
  [3,80,30.022,-0.25,-4.192,27.188,-0.25,-4.333,39,-0.25,-9],
// 4 80 31.013 -0.25 -2.155 27.471 -0.25 -4.033 30.535 -0.25 -3.694 31.686 -0.25 -2.872
  [4,80,31.013,-0.25,-2.155,27.471,-0.25,-4.033,30.535,-0.25,-3.694,31.686,-0.25,-2.872],
// 3 80 25.93 -0.25 -0.616 23.752 -0.25 -1.463 29.114 -0.25 -1.476
  [3,80,25.93,-0.25,-0.616,23.752,-0.25,-1.463,29.114,-0.25,-1.476],
// 4 80 33.847 -0.25 -1.798 34.183 -0.25 -2.411 39 -0.25 -9 39 -0.25 9
  [4,80,33.847,-0.25,-1.798,34.183,-0.25,-2.411,39,-0.25,-9,39,-0.25,9],
// 4 80 32.696 -0.25 1.007 32.838 -0.25 -1.216 33.847 -0.25 -1.798 33.653 -0.25 1.868
  [4,80,32.696,-0.25,1.007,32.838,-0.25,-1.216,33.847,-0.25,-1.798,33.653,-0.25,1.868],
// 3 80 34.183 -0.25 -2.411 33.701 -0.25 -3.148 39 -0.25 -9
  [3,80,34.183,-0.25,-2.411,33.701,-0.25,-3.148,39,-0.25,-9],
// 4 80 31.302 -0.25 -0.702 32.838 -0.25 -1.216 32.696 -0.25 1.007 31.221 -0.25 0.529
  [4,80,31.302,-0.25,-0.702,32.838,-0.25,-1.216,32.696,-0.25,1.007,31.221,-0.25,0.529],
// 3 80 22.753 -0.25 0.256 22.863 -0.25 -0.974 25.097 -0.25 -0.405
  [3,80,22.753,-0.25,0.256,22.863,-0.25,-0.974,25.097,-0.25,-0.405],
// 4 80 4.206 -0.25 2.315 12.133 -0.25 1.001 11.783 -0.25 1.654 7.386 -0.25 2.64
  [4,80,4.206,-0.25,2.315,12.133,-0.25,1.001,11.783,-0.25,1.654,7.386,-0.25,2.64],
// 4 80 14.949 -0.25 0.94 14.312 -0.25 0.368 21.422 -0.25 0.773 20.599 -0.25 1.696
  [4,80,14.949,-0.25,0.94,14.312,-0.25,0.368,21.422,-0.25,0.773,20.599,-0.25,1.696],
// 3 80 20.599 -0.25 1.696 15.161 -0.25 1.512 14.949 -0.25 0.94
  [3,80,20.599,-0.25,1.696,15.161,-0.25,1.512,14.949,-0.25,0.94],
// 3 80 21.422 -0.25 0.773 14.312 -0.25 0.368 21.405 -0.25 -1.491
  [3,80,21.422,-0.25,0.773,14.312,-0.25,0.368,21.405,-0.25,-1.491],
// 4 80 14.672 -0.25 2.26 15.161 -0.25 1.512 20.599 -0.25 1.696 21.05 -0.25 2.378
  [4,80,14.672,-0.25,2.26,15.161,-0.25,1.512,20.599,-0.25,1.696,21.05,-0.25,2.378],
// 4 80 10.733 -0.25 2.179 9.197 -0.25 2.525 7.386 -0.25 2.64 11.783 -0.25 1.654
  [4,80,10.733,-0.25,2.179,9.197,-0.25,2.525,7.386,-0.25,2.64,11.783,-0.25,1.654],
// 4 80 24.509 -0.25 3.358 8.324 -0.25 3.49 11.006 -0.25 3.343 22.405 -0.25 2.96
  [4,80,24.509,-0.25,3.358,8.324,-0.25,3.49,11.006,-0.25,3.343,22.405,-0.25,2.96],
// 4 80 21.05 -0.25 2.378 22.405 -0.25 2.96 13.204 -0.25 2.901 14.672 -0.25 2.26
  [4,80,21.05,-0.25,2.378,22.405,-0.25,2.96,13.204,-0.25,2.901,14.672,-0.25,2.26],
// 3 80 11.006 -0.25 3.343 13.204 -0.25 2.901 22.405 -0.25 2.96
  [3,80,11.006,-0.25,3.343,13.204,-0.25,2.901,22.405,-0.25,2.96],
// 4 80 24.974 -0.25 0.946 27.879 -0.25 0.19 29.614 -0.25 0.727 30.57 -0.25 1.137
  [4,80,24.974,-0.25,0.946,27.879,-0.25,0.19,29.614,-0.25,0.727,30.57,-0.25,1.137],
// 4 80 31.138 -0.25 1.924 23.636 -0.25 1.496 24.974 -0.25 0.946 30.57 -0.25 1.137
  [4,80,31.138,-0.25,1.924,23.636,-0.25,1.496,24.974,-0.25,0.946,30.57,-0.25,1.137],
// 3 80 31.221 -0.25 0.529 28.711 -0.25 -0.027 31.302 -0.25 -0.702
  [3,80,31.221,-0.25,0.529,28.711,-0.25,-0.027,31.302,-0.25,-0.702],
// 3 80 39 -0.25 9 27.205 -0.25 3.49 29.827 -0.25 3.367
  [3,80,39,-0.25,9,27.205,-0.25,3.49,29.827,-0.25,3.367],
// 4 80 27.205 -0.25 3.49 39 -0.25 9 8.324 -0.25 3.49 24.509 -0.25 3.358
  [4,80,27.205,-0.25,3.49,39,-0.25,9,8.324,-0.25,3.49,24.509,-0.25,3.358],
// 4 80 27.241 -0.25 3.168 24.3 -0.25 2.84 23.636 -0.25 1.496 31.138 -0.25 1.924
  [4,80,27.241,-0.25,3.168,24.3,-0.25,2.84,23.636,-0.25,1.496,31.138,-0.25,1.924],
// 3 80 39 -0.25 9 29.827 -0.25 3.367 31.881 -0.25 2.996
  [3,80,39,-0.25,9,29.827,-0.25,3.367,31.881,-0.25,2.996],
// 3 80 39 -0.25 9 31.881 -0.25 2.996 33.209 -0.25 2.467
  [3,80,39,-0.25,9,31.881,-0.25,2.996,33.209,-0.25,2.467],
// 3 80 39 -0.25 9 33.209 -0.25 2.467 33.653 -0.25 1.868
  [3,80,39,-0.25,9,33.209,-0.25,2.467,33.653,-0.25,1.868],
// 3 80 27.241 -0.25 3.168 31.138 -0.25 1.924 30.092 -0.25 2.837
  [3,80,27.241,-0.25,3.168,31.138,-0.25,1.924,30.092,-0.25,2.837],
// 3 80 39 -0.25 9 33.653 -0.25 1.868 33.847 -0.25 -1.798
  [3,80,39,-0.25,9,33.653,-0.25,1.868,33.847,-0.25,-1.798],
// 3 80 24.3 -0.25 2.84 23.167 -0.25 2.073 23.636 -0.25 1.496
  [3,80,24.3,-0.25,2.84,23.167,-0.25,2.073,23.636,-0.25,1.496],
// 3 80 39 -0.25 9 -39 -0.25 9 8.324 -0.25 3.49
  [3,80,39,-0.25,9,-39,-0.25,9,8.324,-0.25,3.49],
// 3 80 2.126 -0.25 1.362 7.47 -0.25 -1.9 9.582 -0.25 -1.072
  [3,80,2.126,-0.25,1.362,7.47,-0.25,-1.9,9.582,-0.25,-1.072],
];
module ldraw_lib__4188571l(step=0, col=false, unit=2/5, alt=false, line=0.2, solid=!$preview)
    makepoly(ldraw_lib__4188571l(), step=step, col=col, unit=unit, alt=alt, line=line, solid=solid);
ldraw_lib__4188571l(line=0.2);
